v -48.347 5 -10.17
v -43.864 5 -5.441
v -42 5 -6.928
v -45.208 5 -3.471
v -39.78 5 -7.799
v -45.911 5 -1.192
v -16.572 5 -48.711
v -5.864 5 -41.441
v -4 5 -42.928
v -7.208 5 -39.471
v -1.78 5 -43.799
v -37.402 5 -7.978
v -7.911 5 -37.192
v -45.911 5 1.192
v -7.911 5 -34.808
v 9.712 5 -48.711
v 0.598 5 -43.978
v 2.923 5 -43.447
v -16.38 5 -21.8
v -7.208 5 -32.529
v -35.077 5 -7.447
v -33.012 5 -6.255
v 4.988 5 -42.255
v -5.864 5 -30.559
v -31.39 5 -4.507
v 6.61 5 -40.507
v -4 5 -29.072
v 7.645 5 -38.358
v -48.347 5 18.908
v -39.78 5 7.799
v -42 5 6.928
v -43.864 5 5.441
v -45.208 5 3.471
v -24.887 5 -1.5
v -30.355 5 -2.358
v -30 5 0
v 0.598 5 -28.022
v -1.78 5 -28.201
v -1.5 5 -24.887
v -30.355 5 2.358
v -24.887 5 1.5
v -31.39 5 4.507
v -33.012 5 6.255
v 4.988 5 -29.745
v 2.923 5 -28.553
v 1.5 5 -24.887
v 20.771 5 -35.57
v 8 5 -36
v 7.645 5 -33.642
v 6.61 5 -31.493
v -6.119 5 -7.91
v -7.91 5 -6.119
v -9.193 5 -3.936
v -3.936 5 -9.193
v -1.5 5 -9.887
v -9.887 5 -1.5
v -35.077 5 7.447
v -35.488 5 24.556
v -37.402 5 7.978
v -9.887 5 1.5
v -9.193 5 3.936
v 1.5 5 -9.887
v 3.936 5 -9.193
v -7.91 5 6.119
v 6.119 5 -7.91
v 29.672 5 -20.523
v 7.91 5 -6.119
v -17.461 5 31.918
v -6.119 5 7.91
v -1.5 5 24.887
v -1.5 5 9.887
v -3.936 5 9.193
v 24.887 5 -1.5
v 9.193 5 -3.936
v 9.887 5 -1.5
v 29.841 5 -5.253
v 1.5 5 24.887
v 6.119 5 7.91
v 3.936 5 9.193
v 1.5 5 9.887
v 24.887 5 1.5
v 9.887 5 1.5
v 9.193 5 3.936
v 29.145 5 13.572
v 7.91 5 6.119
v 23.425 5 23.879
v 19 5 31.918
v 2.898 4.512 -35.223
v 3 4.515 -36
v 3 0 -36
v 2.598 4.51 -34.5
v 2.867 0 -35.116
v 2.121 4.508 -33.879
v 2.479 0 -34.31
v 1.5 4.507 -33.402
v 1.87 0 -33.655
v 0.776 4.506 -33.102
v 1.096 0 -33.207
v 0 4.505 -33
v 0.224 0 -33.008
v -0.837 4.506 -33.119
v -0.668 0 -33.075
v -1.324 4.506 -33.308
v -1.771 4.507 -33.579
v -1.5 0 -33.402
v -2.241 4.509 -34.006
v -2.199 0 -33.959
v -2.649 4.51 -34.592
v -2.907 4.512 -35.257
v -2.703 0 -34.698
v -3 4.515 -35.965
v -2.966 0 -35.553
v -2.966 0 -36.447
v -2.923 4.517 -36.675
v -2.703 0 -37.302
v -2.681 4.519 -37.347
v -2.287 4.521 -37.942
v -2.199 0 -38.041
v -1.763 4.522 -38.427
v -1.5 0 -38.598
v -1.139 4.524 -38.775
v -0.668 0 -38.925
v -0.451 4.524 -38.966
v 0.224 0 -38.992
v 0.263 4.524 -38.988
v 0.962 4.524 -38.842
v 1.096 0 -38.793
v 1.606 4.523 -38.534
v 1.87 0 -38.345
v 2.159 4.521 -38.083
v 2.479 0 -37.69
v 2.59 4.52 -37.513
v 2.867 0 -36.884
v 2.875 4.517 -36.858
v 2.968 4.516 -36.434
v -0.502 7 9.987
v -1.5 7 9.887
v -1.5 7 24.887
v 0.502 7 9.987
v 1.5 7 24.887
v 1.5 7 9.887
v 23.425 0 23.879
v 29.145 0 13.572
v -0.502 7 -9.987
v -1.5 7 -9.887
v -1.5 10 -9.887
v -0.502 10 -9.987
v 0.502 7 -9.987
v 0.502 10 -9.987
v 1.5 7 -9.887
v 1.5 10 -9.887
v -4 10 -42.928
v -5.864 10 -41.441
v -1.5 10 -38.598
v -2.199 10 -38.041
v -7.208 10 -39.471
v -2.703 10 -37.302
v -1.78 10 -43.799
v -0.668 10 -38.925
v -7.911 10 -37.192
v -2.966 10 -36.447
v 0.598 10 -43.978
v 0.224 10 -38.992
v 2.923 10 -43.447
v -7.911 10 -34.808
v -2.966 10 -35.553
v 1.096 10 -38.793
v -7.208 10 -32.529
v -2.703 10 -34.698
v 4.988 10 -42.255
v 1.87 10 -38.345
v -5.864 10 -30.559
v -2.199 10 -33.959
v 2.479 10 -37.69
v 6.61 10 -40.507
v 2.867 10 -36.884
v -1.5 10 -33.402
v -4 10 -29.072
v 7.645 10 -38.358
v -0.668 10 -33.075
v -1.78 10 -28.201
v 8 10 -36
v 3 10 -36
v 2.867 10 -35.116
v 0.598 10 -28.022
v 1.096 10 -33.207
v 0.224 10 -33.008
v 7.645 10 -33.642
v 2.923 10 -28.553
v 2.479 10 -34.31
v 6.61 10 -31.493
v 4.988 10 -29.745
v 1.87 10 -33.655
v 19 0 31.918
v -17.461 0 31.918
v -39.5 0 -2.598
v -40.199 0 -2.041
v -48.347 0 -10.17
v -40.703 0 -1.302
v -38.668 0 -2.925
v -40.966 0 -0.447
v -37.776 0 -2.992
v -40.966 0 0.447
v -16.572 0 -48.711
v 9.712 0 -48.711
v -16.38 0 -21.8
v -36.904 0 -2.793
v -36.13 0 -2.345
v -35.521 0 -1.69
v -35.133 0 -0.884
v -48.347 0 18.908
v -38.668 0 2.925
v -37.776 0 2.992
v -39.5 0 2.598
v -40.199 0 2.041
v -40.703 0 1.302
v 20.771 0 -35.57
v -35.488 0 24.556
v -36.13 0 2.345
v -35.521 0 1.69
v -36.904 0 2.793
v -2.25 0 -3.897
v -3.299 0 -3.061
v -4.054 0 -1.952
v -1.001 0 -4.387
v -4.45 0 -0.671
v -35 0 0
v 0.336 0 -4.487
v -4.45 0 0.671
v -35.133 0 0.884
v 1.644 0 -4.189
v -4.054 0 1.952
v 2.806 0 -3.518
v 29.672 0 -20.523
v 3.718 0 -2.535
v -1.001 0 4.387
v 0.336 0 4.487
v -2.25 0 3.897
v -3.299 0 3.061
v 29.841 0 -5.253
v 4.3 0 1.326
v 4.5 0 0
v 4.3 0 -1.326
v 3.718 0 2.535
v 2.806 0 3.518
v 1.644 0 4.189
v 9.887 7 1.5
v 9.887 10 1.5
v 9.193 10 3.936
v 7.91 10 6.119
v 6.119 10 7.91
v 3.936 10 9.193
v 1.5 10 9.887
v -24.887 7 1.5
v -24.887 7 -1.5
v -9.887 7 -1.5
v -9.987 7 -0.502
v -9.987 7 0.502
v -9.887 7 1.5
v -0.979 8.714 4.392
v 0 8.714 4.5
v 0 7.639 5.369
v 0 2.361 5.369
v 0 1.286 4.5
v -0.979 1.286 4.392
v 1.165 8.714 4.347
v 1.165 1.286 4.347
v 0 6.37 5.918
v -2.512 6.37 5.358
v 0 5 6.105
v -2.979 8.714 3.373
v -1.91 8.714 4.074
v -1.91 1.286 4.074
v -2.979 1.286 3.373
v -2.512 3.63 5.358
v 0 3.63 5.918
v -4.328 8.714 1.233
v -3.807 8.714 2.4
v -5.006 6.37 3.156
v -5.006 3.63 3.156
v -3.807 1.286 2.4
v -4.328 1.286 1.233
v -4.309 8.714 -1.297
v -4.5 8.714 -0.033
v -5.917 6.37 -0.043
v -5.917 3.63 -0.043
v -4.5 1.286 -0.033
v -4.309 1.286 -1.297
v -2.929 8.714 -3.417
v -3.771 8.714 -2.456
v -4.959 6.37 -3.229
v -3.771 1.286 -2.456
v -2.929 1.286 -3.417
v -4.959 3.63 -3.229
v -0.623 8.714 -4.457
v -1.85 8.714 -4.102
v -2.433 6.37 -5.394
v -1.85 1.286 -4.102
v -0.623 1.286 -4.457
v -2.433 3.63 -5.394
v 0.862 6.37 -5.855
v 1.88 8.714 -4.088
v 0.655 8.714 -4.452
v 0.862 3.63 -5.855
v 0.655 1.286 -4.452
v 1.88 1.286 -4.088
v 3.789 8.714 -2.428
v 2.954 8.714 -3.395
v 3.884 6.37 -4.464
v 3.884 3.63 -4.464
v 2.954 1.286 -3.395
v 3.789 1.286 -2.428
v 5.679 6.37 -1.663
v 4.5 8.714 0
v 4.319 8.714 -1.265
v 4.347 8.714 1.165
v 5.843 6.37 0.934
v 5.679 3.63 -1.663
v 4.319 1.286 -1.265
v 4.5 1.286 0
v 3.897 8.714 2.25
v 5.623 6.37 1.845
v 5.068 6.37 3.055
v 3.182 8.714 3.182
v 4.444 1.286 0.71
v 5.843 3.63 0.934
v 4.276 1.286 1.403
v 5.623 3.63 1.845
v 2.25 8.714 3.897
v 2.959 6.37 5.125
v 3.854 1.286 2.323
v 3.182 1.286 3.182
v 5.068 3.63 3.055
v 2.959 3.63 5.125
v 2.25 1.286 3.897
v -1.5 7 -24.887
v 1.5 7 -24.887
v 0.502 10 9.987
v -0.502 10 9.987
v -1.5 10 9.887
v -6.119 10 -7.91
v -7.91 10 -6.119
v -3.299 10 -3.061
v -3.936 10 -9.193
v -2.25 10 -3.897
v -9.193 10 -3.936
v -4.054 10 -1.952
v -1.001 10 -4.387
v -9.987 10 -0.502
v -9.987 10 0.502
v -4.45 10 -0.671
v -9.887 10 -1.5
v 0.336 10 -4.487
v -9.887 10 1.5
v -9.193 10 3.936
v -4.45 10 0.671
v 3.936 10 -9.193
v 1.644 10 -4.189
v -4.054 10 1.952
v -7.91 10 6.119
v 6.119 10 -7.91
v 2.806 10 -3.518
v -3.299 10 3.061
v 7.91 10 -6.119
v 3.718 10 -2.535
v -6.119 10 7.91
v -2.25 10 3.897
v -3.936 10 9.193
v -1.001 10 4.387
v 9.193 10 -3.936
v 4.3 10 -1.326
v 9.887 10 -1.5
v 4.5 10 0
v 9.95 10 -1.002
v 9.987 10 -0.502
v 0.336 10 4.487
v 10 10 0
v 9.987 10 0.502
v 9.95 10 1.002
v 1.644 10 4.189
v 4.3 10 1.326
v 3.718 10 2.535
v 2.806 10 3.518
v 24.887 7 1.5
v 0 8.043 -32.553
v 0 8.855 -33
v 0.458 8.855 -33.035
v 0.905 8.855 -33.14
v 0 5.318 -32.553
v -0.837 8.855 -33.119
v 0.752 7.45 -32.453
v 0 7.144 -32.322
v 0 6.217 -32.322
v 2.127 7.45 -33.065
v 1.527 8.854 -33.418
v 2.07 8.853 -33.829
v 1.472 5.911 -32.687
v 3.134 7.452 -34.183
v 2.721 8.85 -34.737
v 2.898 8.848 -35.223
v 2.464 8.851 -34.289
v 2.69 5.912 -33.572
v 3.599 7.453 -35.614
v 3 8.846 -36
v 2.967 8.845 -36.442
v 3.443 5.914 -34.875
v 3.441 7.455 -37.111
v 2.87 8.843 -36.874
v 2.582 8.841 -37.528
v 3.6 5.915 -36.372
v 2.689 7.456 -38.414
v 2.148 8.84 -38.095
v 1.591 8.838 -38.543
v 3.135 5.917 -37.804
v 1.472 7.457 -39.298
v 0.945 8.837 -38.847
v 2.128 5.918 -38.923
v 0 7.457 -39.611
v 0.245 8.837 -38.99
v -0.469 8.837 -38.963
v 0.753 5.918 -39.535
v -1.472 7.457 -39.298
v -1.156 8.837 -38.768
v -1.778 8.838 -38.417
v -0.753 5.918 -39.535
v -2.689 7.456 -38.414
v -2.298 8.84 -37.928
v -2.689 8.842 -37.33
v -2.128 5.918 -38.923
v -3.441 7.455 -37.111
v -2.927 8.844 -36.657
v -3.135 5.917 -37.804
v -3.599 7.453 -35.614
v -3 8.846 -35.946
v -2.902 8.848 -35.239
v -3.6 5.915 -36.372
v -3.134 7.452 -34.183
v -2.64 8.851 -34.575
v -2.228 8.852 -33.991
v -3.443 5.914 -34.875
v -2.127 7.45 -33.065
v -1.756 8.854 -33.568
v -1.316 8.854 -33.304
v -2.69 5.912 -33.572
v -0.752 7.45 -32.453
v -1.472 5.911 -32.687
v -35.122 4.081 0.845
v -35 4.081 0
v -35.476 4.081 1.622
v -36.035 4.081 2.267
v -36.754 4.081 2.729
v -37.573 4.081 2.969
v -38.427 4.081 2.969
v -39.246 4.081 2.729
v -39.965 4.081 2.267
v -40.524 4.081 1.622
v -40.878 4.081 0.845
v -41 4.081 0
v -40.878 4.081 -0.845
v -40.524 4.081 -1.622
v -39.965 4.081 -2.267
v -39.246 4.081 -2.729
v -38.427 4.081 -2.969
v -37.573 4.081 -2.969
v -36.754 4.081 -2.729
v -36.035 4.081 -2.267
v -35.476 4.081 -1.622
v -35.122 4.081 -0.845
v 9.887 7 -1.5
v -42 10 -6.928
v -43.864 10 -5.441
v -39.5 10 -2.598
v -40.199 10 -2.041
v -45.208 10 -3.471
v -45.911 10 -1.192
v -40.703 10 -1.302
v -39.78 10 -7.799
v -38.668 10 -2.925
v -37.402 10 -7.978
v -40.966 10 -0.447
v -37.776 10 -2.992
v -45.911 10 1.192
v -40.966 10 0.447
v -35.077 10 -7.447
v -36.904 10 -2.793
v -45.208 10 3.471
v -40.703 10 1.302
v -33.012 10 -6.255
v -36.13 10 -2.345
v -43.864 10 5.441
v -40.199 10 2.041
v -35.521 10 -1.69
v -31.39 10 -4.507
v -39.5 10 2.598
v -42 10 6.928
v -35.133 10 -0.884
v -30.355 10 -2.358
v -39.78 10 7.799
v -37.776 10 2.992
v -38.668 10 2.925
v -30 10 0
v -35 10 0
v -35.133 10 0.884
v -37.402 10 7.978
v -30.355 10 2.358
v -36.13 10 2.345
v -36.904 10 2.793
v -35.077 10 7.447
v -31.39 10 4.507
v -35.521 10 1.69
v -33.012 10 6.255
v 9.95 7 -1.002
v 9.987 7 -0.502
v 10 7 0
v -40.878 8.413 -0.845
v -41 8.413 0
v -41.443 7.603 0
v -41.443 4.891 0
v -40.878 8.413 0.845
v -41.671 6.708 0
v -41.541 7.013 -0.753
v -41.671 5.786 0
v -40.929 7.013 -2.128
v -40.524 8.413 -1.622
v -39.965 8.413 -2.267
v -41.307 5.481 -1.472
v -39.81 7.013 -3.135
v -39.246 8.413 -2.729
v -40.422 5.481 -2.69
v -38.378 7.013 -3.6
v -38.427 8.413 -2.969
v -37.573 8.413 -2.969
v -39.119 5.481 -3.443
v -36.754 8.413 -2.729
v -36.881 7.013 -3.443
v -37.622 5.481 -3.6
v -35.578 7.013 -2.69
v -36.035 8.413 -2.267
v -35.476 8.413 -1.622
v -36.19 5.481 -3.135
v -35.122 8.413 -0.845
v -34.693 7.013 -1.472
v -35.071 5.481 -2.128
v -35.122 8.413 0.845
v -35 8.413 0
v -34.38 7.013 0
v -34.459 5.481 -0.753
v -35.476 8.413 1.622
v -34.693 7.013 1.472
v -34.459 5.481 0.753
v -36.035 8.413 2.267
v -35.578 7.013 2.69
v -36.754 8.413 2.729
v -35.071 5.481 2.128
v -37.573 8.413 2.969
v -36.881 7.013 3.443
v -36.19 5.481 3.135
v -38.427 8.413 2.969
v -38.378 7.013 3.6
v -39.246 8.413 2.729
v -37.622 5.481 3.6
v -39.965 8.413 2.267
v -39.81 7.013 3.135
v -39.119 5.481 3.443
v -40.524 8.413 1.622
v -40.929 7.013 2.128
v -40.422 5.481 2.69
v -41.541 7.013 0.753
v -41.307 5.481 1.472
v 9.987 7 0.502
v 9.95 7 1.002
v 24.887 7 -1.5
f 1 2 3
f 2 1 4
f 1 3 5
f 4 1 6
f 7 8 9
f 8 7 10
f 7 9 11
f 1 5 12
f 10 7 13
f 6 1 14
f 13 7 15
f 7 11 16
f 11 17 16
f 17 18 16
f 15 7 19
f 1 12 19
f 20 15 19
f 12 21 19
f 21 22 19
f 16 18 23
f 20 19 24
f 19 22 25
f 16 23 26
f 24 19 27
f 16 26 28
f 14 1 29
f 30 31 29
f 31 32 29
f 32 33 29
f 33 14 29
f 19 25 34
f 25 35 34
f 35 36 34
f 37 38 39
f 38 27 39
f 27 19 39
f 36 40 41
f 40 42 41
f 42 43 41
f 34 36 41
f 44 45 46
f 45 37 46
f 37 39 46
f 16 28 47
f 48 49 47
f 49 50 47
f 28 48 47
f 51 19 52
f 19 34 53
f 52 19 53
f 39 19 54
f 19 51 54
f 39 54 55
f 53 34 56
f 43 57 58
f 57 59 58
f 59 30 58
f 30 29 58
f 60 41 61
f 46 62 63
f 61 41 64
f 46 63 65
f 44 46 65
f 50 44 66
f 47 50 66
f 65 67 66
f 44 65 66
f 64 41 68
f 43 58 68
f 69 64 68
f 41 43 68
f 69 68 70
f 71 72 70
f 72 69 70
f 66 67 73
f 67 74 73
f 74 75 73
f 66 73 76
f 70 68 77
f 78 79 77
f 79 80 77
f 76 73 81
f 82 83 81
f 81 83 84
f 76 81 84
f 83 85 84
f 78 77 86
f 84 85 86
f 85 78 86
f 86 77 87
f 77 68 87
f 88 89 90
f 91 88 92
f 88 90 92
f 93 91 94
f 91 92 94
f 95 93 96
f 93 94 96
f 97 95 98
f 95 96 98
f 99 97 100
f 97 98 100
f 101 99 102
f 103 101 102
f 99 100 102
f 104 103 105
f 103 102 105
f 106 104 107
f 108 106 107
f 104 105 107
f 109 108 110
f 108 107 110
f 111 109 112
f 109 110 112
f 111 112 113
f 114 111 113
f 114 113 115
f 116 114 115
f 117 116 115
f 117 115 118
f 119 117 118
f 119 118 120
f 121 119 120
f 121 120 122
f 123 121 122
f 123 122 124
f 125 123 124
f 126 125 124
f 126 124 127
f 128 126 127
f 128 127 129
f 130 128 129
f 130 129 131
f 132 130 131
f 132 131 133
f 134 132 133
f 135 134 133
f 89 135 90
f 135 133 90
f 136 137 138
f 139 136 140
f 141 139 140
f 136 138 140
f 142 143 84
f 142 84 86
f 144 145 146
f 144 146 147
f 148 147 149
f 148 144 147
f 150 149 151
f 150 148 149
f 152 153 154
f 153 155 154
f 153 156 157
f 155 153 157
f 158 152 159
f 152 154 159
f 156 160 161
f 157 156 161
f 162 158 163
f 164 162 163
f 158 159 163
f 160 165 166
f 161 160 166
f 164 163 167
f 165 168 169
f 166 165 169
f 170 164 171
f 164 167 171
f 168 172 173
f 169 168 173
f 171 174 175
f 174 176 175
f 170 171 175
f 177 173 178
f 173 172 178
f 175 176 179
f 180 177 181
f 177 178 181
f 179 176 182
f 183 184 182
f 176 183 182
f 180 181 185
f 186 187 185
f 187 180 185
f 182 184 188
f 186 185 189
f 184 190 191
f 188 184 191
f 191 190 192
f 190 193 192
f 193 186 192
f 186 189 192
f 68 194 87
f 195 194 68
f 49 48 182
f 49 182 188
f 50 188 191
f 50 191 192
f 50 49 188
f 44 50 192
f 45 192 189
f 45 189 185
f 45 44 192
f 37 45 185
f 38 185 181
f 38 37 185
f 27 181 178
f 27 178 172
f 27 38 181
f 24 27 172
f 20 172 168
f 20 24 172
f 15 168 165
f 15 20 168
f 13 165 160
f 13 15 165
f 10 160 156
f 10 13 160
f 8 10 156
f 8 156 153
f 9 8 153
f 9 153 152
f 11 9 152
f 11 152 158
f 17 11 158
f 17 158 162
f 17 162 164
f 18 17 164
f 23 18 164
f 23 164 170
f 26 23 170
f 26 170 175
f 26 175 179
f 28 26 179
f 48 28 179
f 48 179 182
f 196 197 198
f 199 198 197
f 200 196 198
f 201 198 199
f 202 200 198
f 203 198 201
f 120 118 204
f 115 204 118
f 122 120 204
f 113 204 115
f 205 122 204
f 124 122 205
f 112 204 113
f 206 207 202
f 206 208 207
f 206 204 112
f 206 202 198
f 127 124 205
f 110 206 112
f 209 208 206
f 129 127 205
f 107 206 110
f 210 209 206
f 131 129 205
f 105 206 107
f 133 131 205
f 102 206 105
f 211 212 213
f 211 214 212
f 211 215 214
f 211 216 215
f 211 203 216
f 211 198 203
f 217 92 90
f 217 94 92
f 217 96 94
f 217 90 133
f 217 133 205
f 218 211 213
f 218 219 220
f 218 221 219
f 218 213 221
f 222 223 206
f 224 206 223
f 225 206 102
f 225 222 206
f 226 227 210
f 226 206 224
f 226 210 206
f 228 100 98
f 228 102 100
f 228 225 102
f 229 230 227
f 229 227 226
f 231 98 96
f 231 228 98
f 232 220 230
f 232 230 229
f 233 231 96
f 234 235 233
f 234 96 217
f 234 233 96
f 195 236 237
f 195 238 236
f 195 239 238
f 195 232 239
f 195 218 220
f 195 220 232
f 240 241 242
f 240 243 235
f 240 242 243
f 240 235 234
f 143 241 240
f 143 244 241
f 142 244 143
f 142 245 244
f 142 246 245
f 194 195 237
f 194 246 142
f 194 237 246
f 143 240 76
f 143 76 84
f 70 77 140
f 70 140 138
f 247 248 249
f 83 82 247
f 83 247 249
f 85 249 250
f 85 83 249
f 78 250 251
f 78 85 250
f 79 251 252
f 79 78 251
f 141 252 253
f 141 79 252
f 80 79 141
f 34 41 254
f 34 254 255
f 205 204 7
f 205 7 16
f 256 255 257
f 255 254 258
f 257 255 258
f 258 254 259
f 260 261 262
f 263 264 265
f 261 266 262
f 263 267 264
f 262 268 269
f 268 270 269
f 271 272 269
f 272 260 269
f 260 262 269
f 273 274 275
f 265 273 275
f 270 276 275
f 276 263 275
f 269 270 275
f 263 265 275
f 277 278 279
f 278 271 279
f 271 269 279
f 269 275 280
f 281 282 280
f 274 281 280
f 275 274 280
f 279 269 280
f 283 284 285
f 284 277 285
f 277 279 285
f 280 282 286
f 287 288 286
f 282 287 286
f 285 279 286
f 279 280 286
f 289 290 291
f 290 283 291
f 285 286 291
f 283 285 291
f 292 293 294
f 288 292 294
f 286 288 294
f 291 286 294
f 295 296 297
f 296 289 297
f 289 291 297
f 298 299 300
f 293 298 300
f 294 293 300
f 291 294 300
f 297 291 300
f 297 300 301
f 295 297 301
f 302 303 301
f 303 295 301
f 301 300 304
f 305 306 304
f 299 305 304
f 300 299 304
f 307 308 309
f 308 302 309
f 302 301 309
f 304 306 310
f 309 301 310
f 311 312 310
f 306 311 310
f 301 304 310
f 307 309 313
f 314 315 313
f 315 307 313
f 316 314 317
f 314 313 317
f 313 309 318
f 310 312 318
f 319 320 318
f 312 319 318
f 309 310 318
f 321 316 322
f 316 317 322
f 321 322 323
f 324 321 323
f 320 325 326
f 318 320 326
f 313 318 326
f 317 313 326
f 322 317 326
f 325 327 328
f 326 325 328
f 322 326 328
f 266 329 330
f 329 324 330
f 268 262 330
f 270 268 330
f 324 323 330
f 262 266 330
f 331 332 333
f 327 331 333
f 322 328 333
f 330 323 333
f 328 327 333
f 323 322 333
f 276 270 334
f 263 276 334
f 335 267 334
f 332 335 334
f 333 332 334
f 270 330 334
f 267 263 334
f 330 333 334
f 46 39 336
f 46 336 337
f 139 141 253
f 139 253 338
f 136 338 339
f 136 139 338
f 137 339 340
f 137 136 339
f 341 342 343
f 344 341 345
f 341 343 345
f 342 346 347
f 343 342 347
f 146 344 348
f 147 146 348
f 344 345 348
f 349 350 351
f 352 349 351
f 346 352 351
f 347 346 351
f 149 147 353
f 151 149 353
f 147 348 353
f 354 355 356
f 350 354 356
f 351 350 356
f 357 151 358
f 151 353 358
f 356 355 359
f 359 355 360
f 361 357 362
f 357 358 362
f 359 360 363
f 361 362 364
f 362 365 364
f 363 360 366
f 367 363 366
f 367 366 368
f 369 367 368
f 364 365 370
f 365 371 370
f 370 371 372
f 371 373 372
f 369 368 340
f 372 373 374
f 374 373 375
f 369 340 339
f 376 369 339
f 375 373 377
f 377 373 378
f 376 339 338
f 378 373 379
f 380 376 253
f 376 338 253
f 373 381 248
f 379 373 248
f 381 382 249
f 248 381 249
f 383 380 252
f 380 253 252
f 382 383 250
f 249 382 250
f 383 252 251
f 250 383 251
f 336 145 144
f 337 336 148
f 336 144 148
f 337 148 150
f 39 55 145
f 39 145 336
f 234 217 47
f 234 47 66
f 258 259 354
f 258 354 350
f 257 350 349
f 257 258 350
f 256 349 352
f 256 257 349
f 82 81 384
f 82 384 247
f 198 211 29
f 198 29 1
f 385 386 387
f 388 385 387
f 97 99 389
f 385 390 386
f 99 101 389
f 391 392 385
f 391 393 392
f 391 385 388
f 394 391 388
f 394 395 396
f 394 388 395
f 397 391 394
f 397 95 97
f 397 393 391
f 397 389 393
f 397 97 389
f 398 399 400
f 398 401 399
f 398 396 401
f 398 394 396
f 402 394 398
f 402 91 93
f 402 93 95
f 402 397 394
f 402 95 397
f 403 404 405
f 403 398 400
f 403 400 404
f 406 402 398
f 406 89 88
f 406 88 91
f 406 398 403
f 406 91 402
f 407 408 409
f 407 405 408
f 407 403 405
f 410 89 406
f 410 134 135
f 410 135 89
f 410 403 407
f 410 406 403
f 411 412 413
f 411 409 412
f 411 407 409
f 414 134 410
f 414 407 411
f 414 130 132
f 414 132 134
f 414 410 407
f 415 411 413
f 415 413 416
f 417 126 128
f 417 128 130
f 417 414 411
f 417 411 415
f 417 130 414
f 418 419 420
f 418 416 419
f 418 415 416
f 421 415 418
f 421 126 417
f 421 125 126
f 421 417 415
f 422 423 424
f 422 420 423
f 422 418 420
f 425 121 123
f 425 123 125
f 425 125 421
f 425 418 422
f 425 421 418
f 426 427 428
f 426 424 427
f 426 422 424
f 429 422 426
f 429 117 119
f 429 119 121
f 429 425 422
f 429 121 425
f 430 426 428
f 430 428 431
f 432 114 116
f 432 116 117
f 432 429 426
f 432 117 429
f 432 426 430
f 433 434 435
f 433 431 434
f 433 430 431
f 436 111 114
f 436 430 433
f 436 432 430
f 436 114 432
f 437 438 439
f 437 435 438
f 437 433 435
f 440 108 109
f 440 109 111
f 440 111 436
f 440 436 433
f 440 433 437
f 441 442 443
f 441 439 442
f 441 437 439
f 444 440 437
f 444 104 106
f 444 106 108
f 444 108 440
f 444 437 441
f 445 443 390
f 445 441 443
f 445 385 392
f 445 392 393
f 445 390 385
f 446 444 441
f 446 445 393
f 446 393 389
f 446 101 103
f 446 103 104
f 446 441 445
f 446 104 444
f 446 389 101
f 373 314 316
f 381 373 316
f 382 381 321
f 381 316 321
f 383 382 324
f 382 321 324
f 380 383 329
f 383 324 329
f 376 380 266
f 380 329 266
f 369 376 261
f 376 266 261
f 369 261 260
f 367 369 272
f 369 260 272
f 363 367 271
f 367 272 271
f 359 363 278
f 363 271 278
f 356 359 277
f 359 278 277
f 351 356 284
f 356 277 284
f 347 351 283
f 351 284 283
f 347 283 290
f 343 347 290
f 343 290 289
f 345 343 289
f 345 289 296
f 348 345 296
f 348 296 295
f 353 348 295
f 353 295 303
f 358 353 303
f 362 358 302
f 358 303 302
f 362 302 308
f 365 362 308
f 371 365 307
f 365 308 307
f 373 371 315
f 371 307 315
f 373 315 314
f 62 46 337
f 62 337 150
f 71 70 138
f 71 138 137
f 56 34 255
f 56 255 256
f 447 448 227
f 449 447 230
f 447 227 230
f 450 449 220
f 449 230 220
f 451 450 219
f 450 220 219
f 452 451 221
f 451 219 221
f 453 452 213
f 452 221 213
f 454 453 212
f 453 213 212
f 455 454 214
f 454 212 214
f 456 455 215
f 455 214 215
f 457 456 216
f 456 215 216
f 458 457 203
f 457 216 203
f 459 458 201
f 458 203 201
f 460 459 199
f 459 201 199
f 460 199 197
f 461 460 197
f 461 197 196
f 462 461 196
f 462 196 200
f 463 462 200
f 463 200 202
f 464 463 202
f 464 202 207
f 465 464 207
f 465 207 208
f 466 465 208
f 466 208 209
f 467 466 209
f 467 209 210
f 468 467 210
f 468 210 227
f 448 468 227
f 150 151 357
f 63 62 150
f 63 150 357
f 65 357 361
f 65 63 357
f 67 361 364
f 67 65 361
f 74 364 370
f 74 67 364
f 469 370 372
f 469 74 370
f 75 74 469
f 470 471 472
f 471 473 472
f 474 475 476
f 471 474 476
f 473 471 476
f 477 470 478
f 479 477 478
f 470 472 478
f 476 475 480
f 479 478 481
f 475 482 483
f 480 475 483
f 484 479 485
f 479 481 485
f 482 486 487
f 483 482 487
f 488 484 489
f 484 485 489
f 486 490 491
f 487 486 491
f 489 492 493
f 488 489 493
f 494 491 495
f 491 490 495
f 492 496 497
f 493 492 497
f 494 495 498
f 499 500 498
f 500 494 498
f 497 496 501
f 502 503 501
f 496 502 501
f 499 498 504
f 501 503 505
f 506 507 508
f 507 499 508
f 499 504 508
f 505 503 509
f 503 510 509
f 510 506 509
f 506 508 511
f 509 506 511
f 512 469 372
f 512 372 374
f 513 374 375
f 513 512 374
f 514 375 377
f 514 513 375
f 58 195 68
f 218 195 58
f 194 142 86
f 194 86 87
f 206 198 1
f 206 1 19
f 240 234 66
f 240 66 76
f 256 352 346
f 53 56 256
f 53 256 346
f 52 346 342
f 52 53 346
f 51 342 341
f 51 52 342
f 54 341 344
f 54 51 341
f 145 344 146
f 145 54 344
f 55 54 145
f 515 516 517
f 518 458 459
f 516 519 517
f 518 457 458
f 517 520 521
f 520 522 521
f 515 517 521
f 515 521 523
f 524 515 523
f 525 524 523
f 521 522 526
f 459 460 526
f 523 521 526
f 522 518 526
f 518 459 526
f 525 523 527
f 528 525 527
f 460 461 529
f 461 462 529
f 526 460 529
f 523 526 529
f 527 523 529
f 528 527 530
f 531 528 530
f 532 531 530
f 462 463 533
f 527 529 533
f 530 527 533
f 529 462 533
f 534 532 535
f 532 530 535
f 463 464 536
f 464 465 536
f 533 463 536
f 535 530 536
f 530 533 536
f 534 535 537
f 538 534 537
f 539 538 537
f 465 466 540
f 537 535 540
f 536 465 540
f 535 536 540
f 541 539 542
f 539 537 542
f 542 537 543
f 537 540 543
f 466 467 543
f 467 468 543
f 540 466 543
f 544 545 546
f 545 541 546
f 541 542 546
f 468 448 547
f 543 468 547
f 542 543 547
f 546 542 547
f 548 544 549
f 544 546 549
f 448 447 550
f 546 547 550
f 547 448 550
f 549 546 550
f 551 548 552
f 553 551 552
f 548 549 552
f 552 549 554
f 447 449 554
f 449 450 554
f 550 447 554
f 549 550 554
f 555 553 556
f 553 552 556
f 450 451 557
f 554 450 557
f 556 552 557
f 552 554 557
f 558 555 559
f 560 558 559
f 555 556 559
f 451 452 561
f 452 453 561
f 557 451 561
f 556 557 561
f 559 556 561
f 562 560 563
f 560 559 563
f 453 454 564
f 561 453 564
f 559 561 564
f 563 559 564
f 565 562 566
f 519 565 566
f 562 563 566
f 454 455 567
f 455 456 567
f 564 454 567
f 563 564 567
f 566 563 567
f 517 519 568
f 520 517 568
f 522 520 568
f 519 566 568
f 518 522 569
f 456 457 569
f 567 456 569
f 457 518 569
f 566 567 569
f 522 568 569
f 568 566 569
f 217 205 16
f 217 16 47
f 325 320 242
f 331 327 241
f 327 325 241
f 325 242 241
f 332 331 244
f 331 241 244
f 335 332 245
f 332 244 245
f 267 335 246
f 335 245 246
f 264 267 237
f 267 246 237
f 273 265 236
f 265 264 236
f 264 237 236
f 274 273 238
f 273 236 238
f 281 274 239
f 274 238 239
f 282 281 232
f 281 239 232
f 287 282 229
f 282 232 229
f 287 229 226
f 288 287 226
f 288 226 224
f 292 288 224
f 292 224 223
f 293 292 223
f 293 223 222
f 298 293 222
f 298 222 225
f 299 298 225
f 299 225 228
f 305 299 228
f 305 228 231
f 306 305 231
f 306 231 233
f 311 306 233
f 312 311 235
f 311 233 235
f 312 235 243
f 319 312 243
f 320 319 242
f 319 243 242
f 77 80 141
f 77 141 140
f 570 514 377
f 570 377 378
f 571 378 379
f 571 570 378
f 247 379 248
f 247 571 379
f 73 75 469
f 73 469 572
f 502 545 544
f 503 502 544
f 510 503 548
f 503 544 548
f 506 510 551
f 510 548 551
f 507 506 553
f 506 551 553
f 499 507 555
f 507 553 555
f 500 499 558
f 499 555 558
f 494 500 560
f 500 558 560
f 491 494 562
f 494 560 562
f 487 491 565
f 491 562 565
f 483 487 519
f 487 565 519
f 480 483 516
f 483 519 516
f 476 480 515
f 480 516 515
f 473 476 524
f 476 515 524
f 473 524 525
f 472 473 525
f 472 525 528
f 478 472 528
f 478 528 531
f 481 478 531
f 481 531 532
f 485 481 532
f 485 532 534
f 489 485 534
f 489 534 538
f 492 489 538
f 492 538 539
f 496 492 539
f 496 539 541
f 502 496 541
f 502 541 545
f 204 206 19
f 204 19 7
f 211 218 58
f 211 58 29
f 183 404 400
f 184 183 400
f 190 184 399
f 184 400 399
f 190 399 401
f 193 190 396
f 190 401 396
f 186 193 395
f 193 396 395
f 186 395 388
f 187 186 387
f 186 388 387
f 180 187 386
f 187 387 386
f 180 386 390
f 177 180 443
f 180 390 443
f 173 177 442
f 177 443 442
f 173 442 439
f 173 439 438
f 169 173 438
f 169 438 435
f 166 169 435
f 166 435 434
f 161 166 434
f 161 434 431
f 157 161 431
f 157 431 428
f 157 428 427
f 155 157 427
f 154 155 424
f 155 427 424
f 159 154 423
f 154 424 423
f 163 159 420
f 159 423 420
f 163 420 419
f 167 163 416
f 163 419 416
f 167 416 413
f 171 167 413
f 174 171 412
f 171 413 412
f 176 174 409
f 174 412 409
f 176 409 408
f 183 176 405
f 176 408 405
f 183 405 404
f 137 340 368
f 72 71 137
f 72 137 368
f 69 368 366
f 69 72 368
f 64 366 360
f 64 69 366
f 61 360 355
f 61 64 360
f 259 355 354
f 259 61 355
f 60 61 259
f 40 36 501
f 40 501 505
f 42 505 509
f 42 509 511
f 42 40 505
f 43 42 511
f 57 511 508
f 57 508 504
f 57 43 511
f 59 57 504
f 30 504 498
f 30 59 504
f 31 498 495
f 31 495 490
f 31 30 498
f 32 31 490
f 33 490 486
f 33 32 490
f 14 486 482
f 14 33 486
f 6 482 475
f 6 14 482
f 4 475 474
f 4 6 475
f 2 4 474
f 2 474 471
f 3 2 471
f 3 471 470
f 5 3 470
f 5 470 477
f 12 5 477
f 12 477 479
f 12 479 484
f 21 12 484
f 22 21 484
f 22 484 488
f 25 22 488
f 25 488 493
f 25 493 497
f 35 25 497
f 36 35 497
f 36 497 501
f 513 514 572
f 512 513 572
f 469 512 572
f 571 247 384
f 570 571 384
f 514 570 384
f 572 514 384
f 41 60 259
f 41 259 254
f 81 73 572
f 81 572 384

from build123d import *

# Parameters (mm, degrees)
F0_R     = 8
F0_R_2   = 4.5
F0_R_3   = 3
F1_DEPTH = 5
F2_DEPTH = 10
F3_DEPTH = 7


with BuildPart() as f1:
    # F0 (on Front) → F1 (new body)
    with BuildSketch(Plane.XZ):
        Polygon((18.9996465826, 31.9180320948), (-17.4607320469, 31.9180320948), (-35.4878548533, 24.5556049049), (-48.3473874629, 18.9076156824), (-48.3473874629, -10.1699698716), (-16.3799077272, -21.7999331653), (-16.571868211, -48.7112030387), (9.7124404529, -48.7112030387), (20.7713786513, -35.5700962245), (29.6717043966, -20.5233637244), (29.840618372, -5.252843257), (29.1450880468, 13.5724376887), (23.4245508909, 23.8787811249), align=None)
        with Locations((0, -36)):
            Circle(F0_R, mode=Mode.SUBTRACT)
        with Locations((-38, 0)):
            Circle(F0_R, mode=Mode.SUBTRACT)
        with BuildLine():
            ThreePointArc((1.5, 9.8868599666), (7.0710678119, 7.0710678119), (9.8868599666, 1.5))
            Line((9.8868599666, 1.5), (24.8868599666, 1.5))
            Line((24.8868599666, 1.5), (24.8868599666, 0))
            Line((24.8868599666, 0), (24.8868599666, -1.5))
            Line((24.8868599666, -1.5), (9.8868599666, -1.5))
            ThreePointArc((9.8868599666, -1.5), (7.0710678119, -7.0710678119), (1.5, -9.8868599666))
            Line((1.5, -9.8868599666), (1.5, -24.8868599666))
            Line((1.5, -24.8868599666), (0, -24.8868599666))
            Line((0, -24.8868599666), (-1.5, -24.8868599666))
            Line((-1.5, -24.8868599666), (-1.5, -9.8868599666))
            ThreePointArc((-1.5, -9.8868599666), (-7.0710678119, -7.0710678119), (-9.8868599666, -1.5))
            Line((-9.8868599666, -1.5), (-24.8868599666, -1.5))
            Line((-24.8868599666, -1.5), (-24.8868599666, 0))
            Line((-24.8868599666, 0), (-24.8868599666, 1.5))
            Line((-24.8868599666, 1.5), (-9.8868599666, 1.5))
            ThreePointArc((-9.8868599666, 1.5), (-7.0710678119, 7.0710678119), (-1.5, 9.8868599666))
            Line((-1.5, 9.8868599666), (-1.5, 24.8868599666))
            Line((-1.5, 24.8868599666), (0, 24.8868599666))
            Line((0, 24.8868599666), (1.5, 24.8868599666))
            Line((1.5, 24.8868599666), (1.5, 9.8868599666))
        make_face(mode=Mode.SUBTRACT)
        with BuildLine():
            ThreePointArc((9.8868599666, -1.5), (9.971674876, -0.7521304187), (10, 0))
            ThreePointArc((10, 0), (9.971674876, 0.7521304187), (9.8868599666, 1.5))
            ThreePointArc((9.8868599666, 1.5), (7.0710678119, 7.0710678119), (1.5, 9.8868599666))
            ThreePointArc((1.5, 9.8868599666), (0, 10), (-1.5, 9.8868599666))
            ThreePointArc((-1.5, 9.8868599666), (-7.0710678119, 7.0710678119), (-9.8868599666, 1.5))
            ThreePointArc((-9.8868599666, 1.5), (-10, 0), (-9.8868599666, -1.5))
            ThreePointArc((-9.8868599666, -1.5), (-7.0710678119, -7.0710678119), (-1.5, -9.8868599666))
            ThreePointArc((-1.5, -9.8868599666), (0, -10), (1.5, -9.8868599666))
            ThreePointArc((1.5, -9.8868599666), (7.0710678119, -7.0710678119), (9.8868599666, -1.5))
        make_face()
        Circle(F0_R_2, mode=Mode.SUBTRACT)
        with Locations((-38, 0)):
            Circle(F0_R)
        with Locations((-38, 0)):
            Circle(F0_R_3, mode=Mode.SUBTRACT)
        with Locations((0, -36)):
            Circle(F0_R)
        with Locations((0, -36)):
            Circle(F0_R_3, mode=Mode.SUBTRACT)
        with BuildLine():
            ThreePointArc((-9.8868599666, -1.5), (-10, 0), (-9.8868599666, 1.5))
            Line((-9.8868599666, 1.5), (-24.8868599666, 1.5))
            Line((-24.8868599666, 1.5), (-24.8868599666, 0))
            Line((-24.8868599666, 0), (-24.8868599666, -1.5))
            Line((-24.8868599666, -1.5), (-9.8868599666, -1.5))
        make_face()
        with BuildLine():
            ThreePointArc((-1.5, 9.8868599666), (0, 10), (1.5, 9.8868599666))
            Line((1.5, 9.8868599666), (1.5, 24.8868599666))
            Line((1.5, 24.8868599666), (0, 24.8868599666))
            Line((0, 24.8868599666), (-1.5, 24.8868599666))
            Line((-1.5, 24.8868599666), (-1.5, 9.8868599666))
        make_face()
        with BuildLine():
            ThreePointArc((9.8868599666, 1.5), (9.971674876, 0.7521304187), (10, 0))
            ThreePointArc((10, 0), (9.971674876, -0.7521304187), (9.8868599666, -1.5))
            Line((9.8868599666, -1.5), (24.8868599666, -1.5))
            Line((24.8868599666, -1.5), (24.8868599666, 0))
            Line((24.8868599666, 0), (24.8868599666, 1.5))
            Line((24.8868599666, 1.5), (9.8868599666, 1.5))
        make_face()
        with BuildLine():
            Line((1.5, -24.8868599666), (1.5, -9.8868599666))
            ThreePointArc((1.5, -9.8868599666), (0, -10), (-1.5, -9.8868599666))
            Line((-1.5, -9.8868599666), (-1.5, -24.8868599666))
            Line((-1.5, -24.8868599666), (0, -24.8868599666))
            Line((0, -24.8868599666), (1.5, -24.8868599666))
        make_face()
    extrude(amount=-F1_DEPTH)

    # F0 (on Front) → F2 (join)
    with BuildSketch(Plane.XZ):
        with BuildLine():
            ThreePointArc((9.8868599666, -1.5), (9.971674876, -0.7521304187), (10, 0))
            ThreePointArc((10, 0), (9.971674876, 0.7521304187), (9.8868599666, 1.5))
            ThreePointArc((9.8868599666, 1.5), (7.0710678119, 7.0710678119), (1.5, 9.8868599666))
            ThreePointArc((1.5, 9.8868599666), (0, 10), (-1.5, 9.8868599666))
            ThreePointArc((-1.5, 9.8868599666), (-7.0710678119, 7.0710678119), (-9.8868599666, 1.5))
            ThreePointArc((-9.8868599666, 1.5), (-10, 0), (-9.8868599666, -1.5))
            ThreePointArc((-9.8868599666, -1.5), (-7.0710678119, -7.0710678119), (-1.5, -9.8868599666))
            ThreePointArc((-1.5, -9.8868599666), (0, -10), (1.5, -9.8868599666))
            ThreePointArc((1.5, -9.8868599666), (7.0710678119, -7.0710678119), (9.8868599666, -1.5))
        make_face()
        Circle(F0_R_2, mode=Mode.SUBTRACT)
        with Locations((0, -36)):
            Circle(F0_R)
        with Locations((0, -36)):
            Circle(F0_R_3, mode=Mode.SUBTRACT)
        with Locations((-38, 0)):
            Circle(F0_R)
        with Locations((-38, 0)):
            Circle(F0_R_3, mode=Mode.SUBTRACT)
    extrude(amount=-F2_DEPTH)

    # F0 (on Front) → F3 (join)
    with BuildSketch(Plane.XZ):
        with BuildLine():
            ThreePointArc((-9.8868599666, -1.5), (-10, 0), (-9.8868599666, 1.5))
            Line((-9.8868599666, 1.5), (-24.8868599666, 1.5))
            Line((-24.8868599666, 1.5), (-24.8868599666, 0))
            Line((-24.8868599666, 0), (-24.8868599666, -1.5))
            Line((-24.8868599666, -1.5), (-9.8868599666, -1.5))
        make_face()
        with BuildLine():
            Line((1.5, -24.8868599666), (1.5, -9.8868599666))
            ThreePointArc((1.5, -9.8868599666), (0, -10), (-1.5, -9.8868599666))
            Line((-1.5, -9.8868599666), (-1.5, -24.8868599666))
            Line((-1.5, -24.8868599666), (0, -24.8868599666))
            Line((0, -24.8868599666), (1.5, -24.8868599666))
        make_face()
        with BuildLine():
            ThreePointArc((9.8868599666, 1.5), (9.971674876, 0.7521304187), (10, 0))
            ThreePointArc((10, 0), (9.971674876, -0.7521304187), (9.8868599666, -1.5))
            Line((9.8868599666, -1.5), (24.8868599666, -1.5))
            Line((24.8868599666, -1.5), (24.8868599666, 0))
            Line((24.8868599666, 0), (24.8868599666, 1.5))
            Line((24.8868599666, 1.5), (9.8868599666, 1.5))
        make_face()
        with BuildLine():
            ThreePointArc((-1.5, 9.8868599666), (0, 10), (1.5, 9.8868599666))
            Line((1.5, 9.8868599666), (1.5, 24.8868599666))
            Line((1.5, 24.8868599666), (0, 24.8868599666))
            Line((0, 24.8868599666), (-1.5, 24.8868599666))
            Line((-1.5, 24.8868599666), (-1.5, 9.8868599666))
        make_face()
    extrude(amount=-F3_DEPTH)

    # F5 (on Top) → F6 (revolve, cut)
    with BuildSketch(Plane.XY):
        with BuildLine():
            ThreePointArc((-38, 9.9469926208), (-41.7, 6.2469926208), (-38, 2.5469926208))
            Line((-38, 2.5469926208), (-38, 9.9469926208))
        make_face()
    revolve(axis=Axis((-38, 4.9734963104, 0), (0, -1, 0)), mode=Mode.SUBTRACT)

    # F4 (on Right) → F7 (revolve, cut)
    with BuildSketch(Plane.YZ):
        with BuildLine():
            Line((2.9804437381, -35.9969779618), (10.3804399341, -35.9894746928))
            ThreePointArc((10.3804399341, -35.9894746928), (6.6766902016, -32.2932282293), (2.9804437381, -35.9969779618))
        make_face()
    revolve(axis=Axis((0, 3.1299426986, -35.9968263765), (0, 0.9999994859, 0.0010139553)), mode=Mode.SUBTRACT)

    # F4 (on Right) → F8 (revolve, cut)
    with BuildSketch(Plane.YZ):
        with BuildLine():
            Line((0, 0), (10, 0))
            ThreePointArc((10, 0), (5, 6.1049875621), (0, 0))
        make_face()
    revolve(axis=Axis((0, 5, 0), (0, -1, 0)), mode=Mode.SUBTRACT)


solid = f1.part
